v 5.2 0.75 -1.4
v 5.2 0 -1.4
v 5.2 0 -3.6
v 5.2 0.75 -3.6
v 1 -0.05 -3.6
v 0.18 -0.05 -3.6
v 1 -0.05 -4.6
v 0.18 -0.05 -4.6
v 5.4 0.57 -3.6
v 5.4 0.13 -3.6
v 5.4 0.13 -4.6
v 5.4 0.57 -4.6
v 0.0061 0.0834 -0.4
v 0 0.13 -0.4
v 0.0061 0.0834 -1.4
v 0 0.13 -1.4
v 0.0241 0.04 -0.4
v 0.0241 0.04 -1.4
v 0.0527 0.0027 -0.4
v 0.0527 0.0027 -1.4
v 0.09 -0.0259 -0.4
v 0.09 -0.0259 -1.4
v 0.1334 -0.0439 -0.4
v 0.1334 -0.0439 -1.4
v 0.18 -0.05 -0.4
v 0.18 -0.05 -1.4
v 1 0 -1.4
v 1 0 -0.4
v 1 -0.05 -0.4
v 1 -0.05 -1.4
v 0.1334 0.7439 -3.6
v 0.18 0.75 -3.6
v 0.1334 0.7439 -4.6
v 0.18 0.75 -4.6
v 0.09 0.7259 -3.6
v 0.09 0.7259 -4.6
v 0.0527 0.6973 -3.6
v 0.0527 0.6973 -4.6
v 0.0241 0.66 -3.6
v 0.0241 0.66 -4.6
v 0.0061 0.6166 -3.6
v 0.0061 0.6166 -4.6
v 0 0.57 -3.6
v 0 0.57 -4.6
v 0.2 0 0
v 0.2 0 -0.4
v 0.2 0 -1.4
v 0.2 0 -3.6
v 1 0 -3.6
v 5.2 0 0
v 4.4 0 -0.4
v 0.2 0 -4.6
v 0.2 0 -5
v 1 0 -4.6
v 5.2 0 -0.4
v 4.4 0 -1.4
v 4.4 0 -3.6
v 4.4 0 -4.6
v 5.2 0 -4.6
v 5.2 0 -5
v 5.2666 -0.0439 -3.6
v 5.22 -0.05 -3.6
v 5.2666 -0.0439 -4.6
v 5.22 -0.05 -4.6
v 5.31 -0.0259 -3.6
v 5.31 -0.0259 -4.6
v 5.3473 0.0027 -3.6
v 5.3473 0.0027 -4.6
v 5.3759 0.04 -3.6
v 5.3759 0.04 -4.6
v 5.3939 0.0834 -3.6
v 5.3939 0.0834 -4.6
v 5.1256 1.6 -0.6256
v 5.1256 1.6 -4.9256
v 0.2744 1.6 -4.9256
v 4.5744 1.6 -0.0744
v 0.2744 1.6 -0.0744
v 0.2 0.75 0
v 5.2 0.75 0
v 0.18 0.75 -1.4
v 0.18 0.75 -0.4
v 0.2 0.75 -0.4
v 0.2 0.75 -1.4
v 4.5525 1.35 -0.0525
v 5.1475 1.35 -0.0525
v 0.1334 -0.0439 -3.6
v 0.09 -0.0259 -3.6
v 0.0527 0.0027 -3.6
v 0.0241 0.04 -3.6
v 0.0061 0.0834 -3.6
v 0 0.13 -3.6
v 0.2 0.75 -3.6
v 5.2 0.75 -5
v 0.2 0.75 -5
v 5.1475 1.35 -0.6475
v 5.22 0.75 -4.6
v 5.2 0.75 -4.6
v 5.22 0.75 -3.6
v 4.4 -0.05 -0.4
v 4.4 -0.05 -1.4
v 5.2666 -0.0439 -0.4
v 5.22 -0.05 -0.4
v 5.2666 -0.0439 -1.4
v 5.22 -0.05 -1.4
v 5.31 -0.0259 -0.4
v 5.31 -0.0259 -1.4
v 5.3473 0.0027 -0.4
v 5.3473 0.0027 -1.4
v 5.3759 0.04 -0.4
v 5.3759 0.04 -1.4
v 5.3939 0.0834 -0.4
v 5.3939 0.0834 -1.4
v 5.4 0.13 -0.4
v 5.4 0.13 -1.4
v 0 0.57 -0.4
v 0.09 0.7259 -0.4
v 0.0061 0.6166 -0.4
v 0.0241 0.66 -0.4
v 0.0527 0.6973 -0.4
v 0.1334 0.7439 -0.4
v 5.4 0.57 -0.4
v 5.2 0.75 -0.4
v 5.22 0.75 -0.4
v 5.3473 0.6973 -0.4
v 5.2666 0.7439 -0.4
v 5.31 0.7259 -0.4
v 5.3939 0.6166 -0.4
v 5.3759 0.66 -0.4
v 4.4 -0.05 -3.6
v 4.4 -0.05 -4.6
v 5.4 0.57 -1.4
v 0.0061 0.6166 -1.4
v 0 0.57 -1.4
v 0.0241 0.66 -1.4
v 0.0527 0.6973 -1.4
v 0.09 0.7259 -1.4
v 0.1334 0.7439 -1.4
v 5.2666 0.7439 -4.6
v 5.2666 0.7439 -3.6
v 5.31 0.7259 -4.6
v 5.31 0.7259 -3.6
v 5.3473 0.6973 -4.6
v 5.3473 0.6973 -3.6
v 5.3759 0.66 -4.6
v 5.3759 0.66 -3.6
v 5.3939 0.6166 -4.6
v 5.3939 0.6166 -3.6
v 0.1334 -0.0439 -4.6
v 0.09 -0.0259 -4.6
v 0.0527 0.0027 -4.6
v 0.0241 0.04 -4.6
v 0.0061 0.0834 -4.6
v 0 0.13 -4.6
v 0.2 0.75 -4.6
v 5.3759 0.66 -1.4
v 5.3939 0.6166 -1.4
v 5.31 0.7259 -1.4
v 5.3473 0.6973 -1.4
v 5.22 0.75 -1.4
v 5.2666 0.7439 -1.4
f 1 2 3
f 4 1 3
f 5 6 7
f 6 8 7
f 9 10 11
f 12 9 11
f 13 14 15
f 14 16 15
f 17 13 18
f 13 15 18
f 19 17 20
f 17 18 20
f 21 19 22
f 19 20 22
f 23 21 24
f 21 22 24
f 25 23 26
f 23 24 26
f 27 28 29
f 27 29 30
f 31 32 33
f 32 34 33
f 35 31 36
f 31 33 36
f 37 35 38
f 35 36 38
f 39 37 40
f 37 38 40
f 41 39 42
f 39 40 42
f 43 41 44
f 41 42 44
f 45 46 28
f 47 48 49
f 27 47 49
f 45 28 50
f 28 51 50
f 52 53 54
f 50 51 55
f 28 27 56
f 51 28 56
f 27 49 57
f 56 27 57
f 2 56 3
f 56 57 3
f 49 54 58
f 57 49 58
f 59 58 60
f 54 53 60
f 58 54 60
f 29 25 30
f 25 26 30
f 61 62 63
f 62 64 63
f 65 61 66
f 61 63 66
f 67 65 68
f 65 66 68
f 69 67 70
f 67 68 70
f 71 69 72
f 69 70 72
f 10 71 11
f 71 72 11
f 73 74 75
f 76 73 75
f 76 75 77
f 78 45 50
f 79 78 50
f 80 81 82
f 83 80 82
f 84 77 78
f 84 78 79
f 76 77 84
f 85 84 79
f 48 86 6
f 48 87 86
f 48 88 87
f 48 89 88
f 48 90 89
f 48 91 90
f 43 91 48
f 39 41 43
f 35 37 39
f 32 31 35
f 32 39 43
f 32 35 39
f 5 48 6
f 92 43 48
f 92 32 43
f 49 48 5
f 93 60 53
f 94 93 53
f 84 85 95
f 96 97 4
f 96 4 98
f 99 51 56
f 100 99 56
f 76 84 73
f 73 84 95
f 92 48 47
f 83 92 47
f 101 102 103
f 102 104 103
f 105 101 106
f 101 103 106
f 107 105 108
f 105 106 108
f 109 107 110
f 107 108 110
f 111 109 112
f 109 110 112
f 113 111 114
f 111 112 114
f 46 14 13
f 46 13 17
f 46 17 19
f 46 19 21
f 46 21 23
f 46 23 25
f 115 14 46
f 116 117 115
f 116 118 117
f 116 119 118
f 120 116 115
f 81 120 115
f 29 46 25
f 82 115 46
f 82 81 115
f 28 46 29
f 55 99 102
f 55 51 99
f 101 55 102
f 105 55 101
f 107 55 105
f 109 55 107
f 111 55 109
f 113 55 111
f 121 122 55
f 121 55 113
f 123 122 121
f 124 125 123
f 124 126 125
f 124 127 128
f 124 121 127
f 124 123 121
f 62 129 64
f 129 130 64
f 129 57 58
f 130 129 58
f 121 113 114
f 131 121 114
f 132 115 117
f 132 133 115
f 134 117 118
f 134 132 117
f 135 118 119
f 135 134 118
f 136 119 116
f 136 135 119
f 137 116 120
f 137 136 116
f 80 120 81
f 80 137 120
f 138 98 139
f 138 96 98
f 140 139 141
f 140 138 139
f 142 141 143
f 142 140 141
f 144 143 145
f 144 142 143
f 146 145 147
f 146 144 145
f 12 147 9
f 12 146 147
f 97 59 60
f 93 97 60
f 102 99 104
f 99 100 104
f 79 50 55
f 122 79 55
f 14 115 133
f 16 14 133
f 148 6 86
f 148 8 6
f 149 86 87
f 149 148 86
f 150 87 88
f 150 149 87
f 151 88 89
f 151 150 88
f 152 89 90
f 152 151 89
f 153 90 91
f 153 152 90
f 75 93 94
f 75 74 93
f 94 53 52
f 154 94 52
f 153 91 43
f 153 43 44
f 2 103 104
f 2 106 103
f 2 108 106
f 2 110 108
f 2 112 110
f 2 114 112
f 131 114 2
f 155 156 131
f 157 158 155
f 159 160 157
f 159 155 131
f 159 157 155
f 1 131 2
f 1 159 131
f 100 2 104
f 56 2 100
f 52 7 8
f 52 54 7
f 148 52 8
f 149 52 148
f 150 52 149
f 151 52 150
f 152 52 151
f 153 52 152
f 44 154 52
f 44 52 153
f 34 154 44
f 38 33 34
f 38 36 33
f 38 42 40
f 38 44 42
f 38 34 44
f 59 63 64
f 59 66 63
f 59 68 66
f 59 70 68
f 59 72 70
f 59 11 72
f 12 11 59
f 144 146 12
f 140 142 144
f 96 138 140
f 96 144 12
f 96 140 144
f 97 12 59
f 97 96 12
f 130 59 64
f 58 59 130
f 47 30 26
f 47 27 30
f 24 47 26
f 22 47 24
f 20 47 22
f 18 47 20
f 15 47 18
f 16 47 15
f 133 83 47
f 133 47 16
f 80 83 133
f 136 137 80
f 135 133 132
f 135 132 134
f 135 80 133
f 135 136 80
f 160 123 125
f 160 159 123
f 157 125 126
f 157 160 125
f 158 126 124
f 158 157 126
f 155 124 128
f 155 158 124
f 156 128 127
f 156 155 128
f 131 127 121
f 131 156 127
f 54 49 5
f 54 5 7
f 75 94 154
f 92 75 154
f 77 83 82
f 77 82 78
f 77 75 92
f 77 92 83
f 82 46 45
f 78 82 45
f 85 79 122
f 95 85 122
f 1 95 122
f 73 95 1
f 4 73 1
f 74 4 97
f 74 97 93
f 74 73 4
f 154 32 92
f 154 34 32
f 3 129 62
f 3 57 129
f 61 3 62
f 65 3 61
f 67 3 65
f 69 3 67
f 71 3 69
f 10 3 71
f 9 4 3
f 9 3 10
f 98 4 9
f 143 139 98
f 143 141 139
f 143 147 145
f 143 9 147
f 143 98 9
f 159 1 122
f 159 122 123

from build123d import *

# Parameters (mm, degrees)
SKETCH1_W                       = 0.8
SKETCH1_H                       = 1
BOSS_EXTRUDE1_DEPTH             = 0.75
BOSS_EXTRUDE3_REACH             = 9.253
SKETCH1_4_W                     = 0.2
SKETCH1_4_H                     = 1
SKETCH1_4_W_2                   = 0.8
BOSS_EXTRUDE3_DIRECTION_2_DEPTH = 0.05
FILLET2_R                       = 0.18
BOSS_EXTRUDE2_DEPTH             = 0.85
BOSS_EXTRUDE2_TAPER             = 5
CUT_EXTRUDE1_START              = 0.6
CUT_EXTRUDE1_DEPTH              = 0.25


with BuildPart() as part:
    # Sketch1 → Boss-Extrude1 (new body)
    with BuildSketch(Plane(origin=(0, 0, 0), x_dir=(1, 0, 0), z_dir=(0, 1, 0))):
        Polygon((5.2, 4.6), (5.2, 5), (0.2, 5), (0.2, 4.6), (1, 4.6), (1, 3.6), (0.2, 3.6), (0.2, 1.4), (1, 1.4), (1, 0.4), (0.2, 0.4), (0.2, 0), (5.2, 0), (5.2, 0.4), (4.4, 0.4), (4.4, 1.4), (5.2, 1.4), (5.2, 3.6), (4.4, 3.6), (4.4, 4.6), align=None)
        with Locations((0.6, 4.1)):
            Rectangle(SKETCH1_W, SKETCH1_H)
        with Locations((4.8, 4.1)):
            Rectangle(SKETCH1_W, SKETCH1_H)
        with Locations((4.8, 0.9)):
            Rectangle(SKETCH1_W, SKETCH1_H)
        with Locations((0.6, 0.9)):
            Rectangle(SKETCH1_W, SKETCH1_H)
    extrude(amount=BOSS_EXTRUDE1_DEPTH)

    # Boss-Extrude3: up to this face of the body (flat: up to its plane)
    boss_extrude3_end = Plane(part.part.faces().sort_by_distance((2.7, 0.75, -2.5))[0])
    # Sketch1<4> → Boss-Extrude3 (add, up to the picked face)
    with BuildSketch(Plane(origin=(0, 0, 0), x_dir=(1, 0, 0), z_dir=(0, 1, 0)), mode=Mode.PRIVATE) as boss_extrude3_sk1:
        with Locations((0.1, 0.9)):
            Rectangle(SKETCH1_4_W, SKETCH1_4_H)
    boss_extrude3_tool1 = split(extrude(boss_extrude3_sk1.sketch, amount=BOSS_EXTRUDE3_REACH, mode=Mode.PRIVATE), bisect_by=boss_extrude3_end, keep=Keep.BOTH, mode=Mode.PRIVATE)
    # Sketch1<4> → Boss-Extrude3 (add, up to the picked face)
    with BuildSketch(Plane(origin=(0, 0, 0), x_dir=(1, 0, 0), z_dir=(0, 1, 0)), mode=Mode.PRIVATE) as boss_extrude3_sk2:
        with Locations((0.6, 0.9)):
            Rectangle(SKETCH1_4_W_2, SKETCH1_4_H)
    boss_extrude3_tool2 = split(extrude(boss_extrude3_sk2.sketch, amount=BOSS_EXTRUDE3_REACH, mode=Mode.PRIVATE), bisect_by=boss_extrude3_end, keep=Keep.BOTH, mode=Mode.PRIVATE)
    # Sketch1<4> → Boss-Extrude3 (add, up to the picked face)
    with BuildSketch(Plane(origin=(0, 0, 0), x_dir=(1, 0, 0), z_dir=(0, 1, 0)), mode=Mode.PRIVATE) as boss_extrude3_sk3:
        with Locations((0.1, 4.1)):
            Rectangle(SKETCH1_4_W, SKETCH1_4_H)
    boss_extrude3_tool3 = split(extrude(boss_extrude3_sk3.sketch, amount=BOSS_EXTRUDE3_REACH, mode=Mode.PRIVATE), bisect_by=boss_extrude3_end, keep=Keep.BOTH, mode=Mode.PRIVATE)
    # Sketch1<4> → Boss-Extrude3 (add, up to the picked face)
    with BuildSketch(Plane(origin=(0, 0, 0), x_dir=(1, 0, 0), z_dir=(0, 1, 0)), mode=Mode.PRIVATE) as boss_extrude3_sk4:
        with Locations((0.6, 4.1)):
            Rectangle(SKETCH1_4_W_2, SKETCH1_4_H)
    boss_extrude3_tool4 = split(extrude(boss_extrude3_sk4.sketch, amount=BOSS_EXTRUDE3_REACH, mode=Mode.PRIVATE), bisect_by=boss_extrude3_end, keep=Keep.BOTH, mode=Mode.PRIVATE)
    # Sketch1<4> → Boss-Extrude3 (add, up to the picked face)
    with BuildSketch(Plane(origin=(0, 0, 0), x_dir=(1, 0, 0), z_dir=(0, 1, 0)), mode=Mode.PRIVATE) as boss_extrude3_sk5:
        with Locations((4.8, 0.9)):
            Rectangle(SKETCH1_4_W_2, SKETCH1_4_H)
    boss_extrude3_tool5 = split(extrude(boss_extrude3_sk5.sketch, amount=BOSS_EXTRUDE3_REACH, mode=Mode.PRIVATE), bisect_by=boss_extrude3_end, keep=Keep.BOTH, mode=Mode.PRIVATE)
    # Sketch1<4> → Boss-Extrude3 (add, up to the picked face)
    with BuildSketch(Plane(origin=(0, 0, 0), x_dir=(1, 0, 0), z_dir=(0, 1, 0)), mode=Mode.PRIVATE) as boss_extrude3_sk6:
        with Locations((5.3, 0.9)):
            Rectangle(SKETCH1_4_W, SKETCH1_4_H)
    boss_extrude3_tool6 = split(extrude(boss_extrude3_sk6.sketch, amount=BOSS_EXTRUDE3_REACH, mode=Mode.PRIVATE), bisect_by=boss_extrude3_end, keep=Keep.BOTH, mode=Mode.PRIVATE)
    # Sketch1<4> → Boss-Extrude3 (add, up to the picked face)
    with BuildSketch(Plane(origin=(0, 0, 0), x_dir=(1, 0, 0), z_dir=(0, 1, 0)), mode=Mode.PRIVATE) as boss_extrude3_sk7:
        with Locations((4.8, 4.1)):
            Rectangle(SKETCH1_4_W_2, SKETCH1_4_H)
    boss_extrude3_tool7 = split(extrude(boss_extrude3_sk7.sketch, amount=BOSS_EXTRUDE3_REACH, mode=Mode.PRIVATE), bisect_by=boss_extrude3_end, keep=Keep.BOTH, mode=Mode.PRIVATE)
    # Sketch1<4> → Boss-Extrude3 (add, up to the picked face)
    with BuildSketch(Plane(origin=(0, 0, 0), x_dir=(1, 0, 0), z_dir=(0, 1, 0)), mode=Mode.PRIVATE) as boss_extrude3_sk8:
        with Locations((5.3, 4.1)):
            Rectangle(SKETCH1_4_W, SKETCH1_4_H)
    boss_extrude3_tool8 = split(extrude(boss_extrude3_sk8.sketch, amount=BOSS_EXTRUDE3_REACH, mode=Mode.PRIVATE), bisect_by=boss_extrude3_end, keep=Keep.BOTH, mode=Mode.PRIVATE)
    add(boss_extrude3_tool1.solids().sort_by(Axis((0.1, 0, -0.9), (0, 1, 0)))[0])
    add(boss_extrude3_tool2.solids().sort_by(Axis((0.6, 0, -0.9), (0, 1, 0)))[0])
    add(boss_extrude3_tool3.solids().sort_by(Axis((0.1, 0, -4.1), (0, 1, 0)))[0])
    add(boss_extrude3_tool4.solids().sort_by(Axis((0.6, 0, -4.1), (0, 1, 0)))[0])
    add(boss_extrude3_tool5.solids().sort_by(Axis((4.8, 0, -0.9), (0, 1, 0)))[0])
    add(boss_extrude3_tool6.solids().sort_by(Axis((5.3, 0, -0.9), (0, 1, 0)))[0])
    add(boss_extrude3_tool7.solids().sort_by(Axis((4.8, 0, -4.1), (0, 1, 0)))[0])
    add(boss_extrude3_tool8.solids().sort_by(Axis((5.3, 0, -4.1), (0, 1, 0)))[0])

    # Sketch1<4> → Boss-Extrude3 direction 2 (add)
    with BuildSketch(Plane(origin=(0, 0, 0), x_dir=(1, 0, 0), z_dir=(0, 1, 0))):
        with Locations((0.1, 0.9)):
            Rectangle(SKETCH1_4_W, SKETCH1_4_H)
        with Locations((0.6, 0.9)):
            Rectangle(SKETCH1_4_W_2, SKETCH1_4_H)
        with Locations((0.1, 4.1)):
            Rectangle(SKETCH1_4_W, SKETCH1_4_H)
        with Locations((0.6, 4.1)):
            Rectangle(SKETCH1_4_W_2, SKETCH1_4_H)
        with Locations((4.8, 0.9)):
            Rectangle(SKETCH1_4_W_2, SKETCH1_4_H)
        with Locations((5.3, 0.9)):
            Rectangle(SKETCH1_4_W, SKETCH1_4_H)
        with Locations((4.8, 4.1)):
            Rectangle(SKETCH1_4_W_2, SKETCH1_4_H)
        with Locations((5.3, 4.1)):
            Rectangle(SKETCH1_4_W, SKETCH1_4_H)
    extrude(amount=-BOSS_EXTRUDE3_DIRECTION_2_DEPTH)

    # Fillet2
    fillet2_edges = [part.edges().sort_by_distance(p)[0] for p in [
        (0, 0.75, -0.9),
        (0, -0.05, -0.9),
        (0, 0.75, -4.1),
        (0, -0.05, -4.1),
        (5.4, -0.05, -0.9),
        (5.4, 0.75, -0.9),
        (5.4, 0.75, -4.1),
        (5.4, -0.05, -4.1),
    ]]
    fillet(fillet2_edges, radius=FILLET2_R)

    # Sketch2 → Boss-Extrude2 (add)
    with BuildSketch(Plane(origin=(0, 0.75, 0), x_dir=(1, 0, 0), z_dir=(0, 1, 0))):
        Polygon((5.2, 1.4), (5.2, 3.6), (5.2, 4.6), (5.2, 5), (0.2, 5), (0.2, 4.6), (0.2, 3.6), (0.2, 1.4), (0.2, 0.4), (0.2, 0), (5.2, 0), (5.2, 0.4), align=None)
    extrude(amount=BOSS_EXTRUDE2_DEPTH, taper=BOSS_EXTRUDE2_TAPER)

    # Sketch4 → Cut-Extrude1 (cut)
    with BuildSketch(Plane(origin=(0, 0.75, 0), x_dir=(1, 0, 0), z_dir=(0, 1, 0)).offset(CUT_EXTRUDE1_START)):
        Polygon((4.5, 0), (5.2, 0.7), (5.2, 0), align=None)
    extrude(amount=CUT_EXTRUDE1_DEPTH, mode=Mode.SUBTRACT)


solid = part.part
